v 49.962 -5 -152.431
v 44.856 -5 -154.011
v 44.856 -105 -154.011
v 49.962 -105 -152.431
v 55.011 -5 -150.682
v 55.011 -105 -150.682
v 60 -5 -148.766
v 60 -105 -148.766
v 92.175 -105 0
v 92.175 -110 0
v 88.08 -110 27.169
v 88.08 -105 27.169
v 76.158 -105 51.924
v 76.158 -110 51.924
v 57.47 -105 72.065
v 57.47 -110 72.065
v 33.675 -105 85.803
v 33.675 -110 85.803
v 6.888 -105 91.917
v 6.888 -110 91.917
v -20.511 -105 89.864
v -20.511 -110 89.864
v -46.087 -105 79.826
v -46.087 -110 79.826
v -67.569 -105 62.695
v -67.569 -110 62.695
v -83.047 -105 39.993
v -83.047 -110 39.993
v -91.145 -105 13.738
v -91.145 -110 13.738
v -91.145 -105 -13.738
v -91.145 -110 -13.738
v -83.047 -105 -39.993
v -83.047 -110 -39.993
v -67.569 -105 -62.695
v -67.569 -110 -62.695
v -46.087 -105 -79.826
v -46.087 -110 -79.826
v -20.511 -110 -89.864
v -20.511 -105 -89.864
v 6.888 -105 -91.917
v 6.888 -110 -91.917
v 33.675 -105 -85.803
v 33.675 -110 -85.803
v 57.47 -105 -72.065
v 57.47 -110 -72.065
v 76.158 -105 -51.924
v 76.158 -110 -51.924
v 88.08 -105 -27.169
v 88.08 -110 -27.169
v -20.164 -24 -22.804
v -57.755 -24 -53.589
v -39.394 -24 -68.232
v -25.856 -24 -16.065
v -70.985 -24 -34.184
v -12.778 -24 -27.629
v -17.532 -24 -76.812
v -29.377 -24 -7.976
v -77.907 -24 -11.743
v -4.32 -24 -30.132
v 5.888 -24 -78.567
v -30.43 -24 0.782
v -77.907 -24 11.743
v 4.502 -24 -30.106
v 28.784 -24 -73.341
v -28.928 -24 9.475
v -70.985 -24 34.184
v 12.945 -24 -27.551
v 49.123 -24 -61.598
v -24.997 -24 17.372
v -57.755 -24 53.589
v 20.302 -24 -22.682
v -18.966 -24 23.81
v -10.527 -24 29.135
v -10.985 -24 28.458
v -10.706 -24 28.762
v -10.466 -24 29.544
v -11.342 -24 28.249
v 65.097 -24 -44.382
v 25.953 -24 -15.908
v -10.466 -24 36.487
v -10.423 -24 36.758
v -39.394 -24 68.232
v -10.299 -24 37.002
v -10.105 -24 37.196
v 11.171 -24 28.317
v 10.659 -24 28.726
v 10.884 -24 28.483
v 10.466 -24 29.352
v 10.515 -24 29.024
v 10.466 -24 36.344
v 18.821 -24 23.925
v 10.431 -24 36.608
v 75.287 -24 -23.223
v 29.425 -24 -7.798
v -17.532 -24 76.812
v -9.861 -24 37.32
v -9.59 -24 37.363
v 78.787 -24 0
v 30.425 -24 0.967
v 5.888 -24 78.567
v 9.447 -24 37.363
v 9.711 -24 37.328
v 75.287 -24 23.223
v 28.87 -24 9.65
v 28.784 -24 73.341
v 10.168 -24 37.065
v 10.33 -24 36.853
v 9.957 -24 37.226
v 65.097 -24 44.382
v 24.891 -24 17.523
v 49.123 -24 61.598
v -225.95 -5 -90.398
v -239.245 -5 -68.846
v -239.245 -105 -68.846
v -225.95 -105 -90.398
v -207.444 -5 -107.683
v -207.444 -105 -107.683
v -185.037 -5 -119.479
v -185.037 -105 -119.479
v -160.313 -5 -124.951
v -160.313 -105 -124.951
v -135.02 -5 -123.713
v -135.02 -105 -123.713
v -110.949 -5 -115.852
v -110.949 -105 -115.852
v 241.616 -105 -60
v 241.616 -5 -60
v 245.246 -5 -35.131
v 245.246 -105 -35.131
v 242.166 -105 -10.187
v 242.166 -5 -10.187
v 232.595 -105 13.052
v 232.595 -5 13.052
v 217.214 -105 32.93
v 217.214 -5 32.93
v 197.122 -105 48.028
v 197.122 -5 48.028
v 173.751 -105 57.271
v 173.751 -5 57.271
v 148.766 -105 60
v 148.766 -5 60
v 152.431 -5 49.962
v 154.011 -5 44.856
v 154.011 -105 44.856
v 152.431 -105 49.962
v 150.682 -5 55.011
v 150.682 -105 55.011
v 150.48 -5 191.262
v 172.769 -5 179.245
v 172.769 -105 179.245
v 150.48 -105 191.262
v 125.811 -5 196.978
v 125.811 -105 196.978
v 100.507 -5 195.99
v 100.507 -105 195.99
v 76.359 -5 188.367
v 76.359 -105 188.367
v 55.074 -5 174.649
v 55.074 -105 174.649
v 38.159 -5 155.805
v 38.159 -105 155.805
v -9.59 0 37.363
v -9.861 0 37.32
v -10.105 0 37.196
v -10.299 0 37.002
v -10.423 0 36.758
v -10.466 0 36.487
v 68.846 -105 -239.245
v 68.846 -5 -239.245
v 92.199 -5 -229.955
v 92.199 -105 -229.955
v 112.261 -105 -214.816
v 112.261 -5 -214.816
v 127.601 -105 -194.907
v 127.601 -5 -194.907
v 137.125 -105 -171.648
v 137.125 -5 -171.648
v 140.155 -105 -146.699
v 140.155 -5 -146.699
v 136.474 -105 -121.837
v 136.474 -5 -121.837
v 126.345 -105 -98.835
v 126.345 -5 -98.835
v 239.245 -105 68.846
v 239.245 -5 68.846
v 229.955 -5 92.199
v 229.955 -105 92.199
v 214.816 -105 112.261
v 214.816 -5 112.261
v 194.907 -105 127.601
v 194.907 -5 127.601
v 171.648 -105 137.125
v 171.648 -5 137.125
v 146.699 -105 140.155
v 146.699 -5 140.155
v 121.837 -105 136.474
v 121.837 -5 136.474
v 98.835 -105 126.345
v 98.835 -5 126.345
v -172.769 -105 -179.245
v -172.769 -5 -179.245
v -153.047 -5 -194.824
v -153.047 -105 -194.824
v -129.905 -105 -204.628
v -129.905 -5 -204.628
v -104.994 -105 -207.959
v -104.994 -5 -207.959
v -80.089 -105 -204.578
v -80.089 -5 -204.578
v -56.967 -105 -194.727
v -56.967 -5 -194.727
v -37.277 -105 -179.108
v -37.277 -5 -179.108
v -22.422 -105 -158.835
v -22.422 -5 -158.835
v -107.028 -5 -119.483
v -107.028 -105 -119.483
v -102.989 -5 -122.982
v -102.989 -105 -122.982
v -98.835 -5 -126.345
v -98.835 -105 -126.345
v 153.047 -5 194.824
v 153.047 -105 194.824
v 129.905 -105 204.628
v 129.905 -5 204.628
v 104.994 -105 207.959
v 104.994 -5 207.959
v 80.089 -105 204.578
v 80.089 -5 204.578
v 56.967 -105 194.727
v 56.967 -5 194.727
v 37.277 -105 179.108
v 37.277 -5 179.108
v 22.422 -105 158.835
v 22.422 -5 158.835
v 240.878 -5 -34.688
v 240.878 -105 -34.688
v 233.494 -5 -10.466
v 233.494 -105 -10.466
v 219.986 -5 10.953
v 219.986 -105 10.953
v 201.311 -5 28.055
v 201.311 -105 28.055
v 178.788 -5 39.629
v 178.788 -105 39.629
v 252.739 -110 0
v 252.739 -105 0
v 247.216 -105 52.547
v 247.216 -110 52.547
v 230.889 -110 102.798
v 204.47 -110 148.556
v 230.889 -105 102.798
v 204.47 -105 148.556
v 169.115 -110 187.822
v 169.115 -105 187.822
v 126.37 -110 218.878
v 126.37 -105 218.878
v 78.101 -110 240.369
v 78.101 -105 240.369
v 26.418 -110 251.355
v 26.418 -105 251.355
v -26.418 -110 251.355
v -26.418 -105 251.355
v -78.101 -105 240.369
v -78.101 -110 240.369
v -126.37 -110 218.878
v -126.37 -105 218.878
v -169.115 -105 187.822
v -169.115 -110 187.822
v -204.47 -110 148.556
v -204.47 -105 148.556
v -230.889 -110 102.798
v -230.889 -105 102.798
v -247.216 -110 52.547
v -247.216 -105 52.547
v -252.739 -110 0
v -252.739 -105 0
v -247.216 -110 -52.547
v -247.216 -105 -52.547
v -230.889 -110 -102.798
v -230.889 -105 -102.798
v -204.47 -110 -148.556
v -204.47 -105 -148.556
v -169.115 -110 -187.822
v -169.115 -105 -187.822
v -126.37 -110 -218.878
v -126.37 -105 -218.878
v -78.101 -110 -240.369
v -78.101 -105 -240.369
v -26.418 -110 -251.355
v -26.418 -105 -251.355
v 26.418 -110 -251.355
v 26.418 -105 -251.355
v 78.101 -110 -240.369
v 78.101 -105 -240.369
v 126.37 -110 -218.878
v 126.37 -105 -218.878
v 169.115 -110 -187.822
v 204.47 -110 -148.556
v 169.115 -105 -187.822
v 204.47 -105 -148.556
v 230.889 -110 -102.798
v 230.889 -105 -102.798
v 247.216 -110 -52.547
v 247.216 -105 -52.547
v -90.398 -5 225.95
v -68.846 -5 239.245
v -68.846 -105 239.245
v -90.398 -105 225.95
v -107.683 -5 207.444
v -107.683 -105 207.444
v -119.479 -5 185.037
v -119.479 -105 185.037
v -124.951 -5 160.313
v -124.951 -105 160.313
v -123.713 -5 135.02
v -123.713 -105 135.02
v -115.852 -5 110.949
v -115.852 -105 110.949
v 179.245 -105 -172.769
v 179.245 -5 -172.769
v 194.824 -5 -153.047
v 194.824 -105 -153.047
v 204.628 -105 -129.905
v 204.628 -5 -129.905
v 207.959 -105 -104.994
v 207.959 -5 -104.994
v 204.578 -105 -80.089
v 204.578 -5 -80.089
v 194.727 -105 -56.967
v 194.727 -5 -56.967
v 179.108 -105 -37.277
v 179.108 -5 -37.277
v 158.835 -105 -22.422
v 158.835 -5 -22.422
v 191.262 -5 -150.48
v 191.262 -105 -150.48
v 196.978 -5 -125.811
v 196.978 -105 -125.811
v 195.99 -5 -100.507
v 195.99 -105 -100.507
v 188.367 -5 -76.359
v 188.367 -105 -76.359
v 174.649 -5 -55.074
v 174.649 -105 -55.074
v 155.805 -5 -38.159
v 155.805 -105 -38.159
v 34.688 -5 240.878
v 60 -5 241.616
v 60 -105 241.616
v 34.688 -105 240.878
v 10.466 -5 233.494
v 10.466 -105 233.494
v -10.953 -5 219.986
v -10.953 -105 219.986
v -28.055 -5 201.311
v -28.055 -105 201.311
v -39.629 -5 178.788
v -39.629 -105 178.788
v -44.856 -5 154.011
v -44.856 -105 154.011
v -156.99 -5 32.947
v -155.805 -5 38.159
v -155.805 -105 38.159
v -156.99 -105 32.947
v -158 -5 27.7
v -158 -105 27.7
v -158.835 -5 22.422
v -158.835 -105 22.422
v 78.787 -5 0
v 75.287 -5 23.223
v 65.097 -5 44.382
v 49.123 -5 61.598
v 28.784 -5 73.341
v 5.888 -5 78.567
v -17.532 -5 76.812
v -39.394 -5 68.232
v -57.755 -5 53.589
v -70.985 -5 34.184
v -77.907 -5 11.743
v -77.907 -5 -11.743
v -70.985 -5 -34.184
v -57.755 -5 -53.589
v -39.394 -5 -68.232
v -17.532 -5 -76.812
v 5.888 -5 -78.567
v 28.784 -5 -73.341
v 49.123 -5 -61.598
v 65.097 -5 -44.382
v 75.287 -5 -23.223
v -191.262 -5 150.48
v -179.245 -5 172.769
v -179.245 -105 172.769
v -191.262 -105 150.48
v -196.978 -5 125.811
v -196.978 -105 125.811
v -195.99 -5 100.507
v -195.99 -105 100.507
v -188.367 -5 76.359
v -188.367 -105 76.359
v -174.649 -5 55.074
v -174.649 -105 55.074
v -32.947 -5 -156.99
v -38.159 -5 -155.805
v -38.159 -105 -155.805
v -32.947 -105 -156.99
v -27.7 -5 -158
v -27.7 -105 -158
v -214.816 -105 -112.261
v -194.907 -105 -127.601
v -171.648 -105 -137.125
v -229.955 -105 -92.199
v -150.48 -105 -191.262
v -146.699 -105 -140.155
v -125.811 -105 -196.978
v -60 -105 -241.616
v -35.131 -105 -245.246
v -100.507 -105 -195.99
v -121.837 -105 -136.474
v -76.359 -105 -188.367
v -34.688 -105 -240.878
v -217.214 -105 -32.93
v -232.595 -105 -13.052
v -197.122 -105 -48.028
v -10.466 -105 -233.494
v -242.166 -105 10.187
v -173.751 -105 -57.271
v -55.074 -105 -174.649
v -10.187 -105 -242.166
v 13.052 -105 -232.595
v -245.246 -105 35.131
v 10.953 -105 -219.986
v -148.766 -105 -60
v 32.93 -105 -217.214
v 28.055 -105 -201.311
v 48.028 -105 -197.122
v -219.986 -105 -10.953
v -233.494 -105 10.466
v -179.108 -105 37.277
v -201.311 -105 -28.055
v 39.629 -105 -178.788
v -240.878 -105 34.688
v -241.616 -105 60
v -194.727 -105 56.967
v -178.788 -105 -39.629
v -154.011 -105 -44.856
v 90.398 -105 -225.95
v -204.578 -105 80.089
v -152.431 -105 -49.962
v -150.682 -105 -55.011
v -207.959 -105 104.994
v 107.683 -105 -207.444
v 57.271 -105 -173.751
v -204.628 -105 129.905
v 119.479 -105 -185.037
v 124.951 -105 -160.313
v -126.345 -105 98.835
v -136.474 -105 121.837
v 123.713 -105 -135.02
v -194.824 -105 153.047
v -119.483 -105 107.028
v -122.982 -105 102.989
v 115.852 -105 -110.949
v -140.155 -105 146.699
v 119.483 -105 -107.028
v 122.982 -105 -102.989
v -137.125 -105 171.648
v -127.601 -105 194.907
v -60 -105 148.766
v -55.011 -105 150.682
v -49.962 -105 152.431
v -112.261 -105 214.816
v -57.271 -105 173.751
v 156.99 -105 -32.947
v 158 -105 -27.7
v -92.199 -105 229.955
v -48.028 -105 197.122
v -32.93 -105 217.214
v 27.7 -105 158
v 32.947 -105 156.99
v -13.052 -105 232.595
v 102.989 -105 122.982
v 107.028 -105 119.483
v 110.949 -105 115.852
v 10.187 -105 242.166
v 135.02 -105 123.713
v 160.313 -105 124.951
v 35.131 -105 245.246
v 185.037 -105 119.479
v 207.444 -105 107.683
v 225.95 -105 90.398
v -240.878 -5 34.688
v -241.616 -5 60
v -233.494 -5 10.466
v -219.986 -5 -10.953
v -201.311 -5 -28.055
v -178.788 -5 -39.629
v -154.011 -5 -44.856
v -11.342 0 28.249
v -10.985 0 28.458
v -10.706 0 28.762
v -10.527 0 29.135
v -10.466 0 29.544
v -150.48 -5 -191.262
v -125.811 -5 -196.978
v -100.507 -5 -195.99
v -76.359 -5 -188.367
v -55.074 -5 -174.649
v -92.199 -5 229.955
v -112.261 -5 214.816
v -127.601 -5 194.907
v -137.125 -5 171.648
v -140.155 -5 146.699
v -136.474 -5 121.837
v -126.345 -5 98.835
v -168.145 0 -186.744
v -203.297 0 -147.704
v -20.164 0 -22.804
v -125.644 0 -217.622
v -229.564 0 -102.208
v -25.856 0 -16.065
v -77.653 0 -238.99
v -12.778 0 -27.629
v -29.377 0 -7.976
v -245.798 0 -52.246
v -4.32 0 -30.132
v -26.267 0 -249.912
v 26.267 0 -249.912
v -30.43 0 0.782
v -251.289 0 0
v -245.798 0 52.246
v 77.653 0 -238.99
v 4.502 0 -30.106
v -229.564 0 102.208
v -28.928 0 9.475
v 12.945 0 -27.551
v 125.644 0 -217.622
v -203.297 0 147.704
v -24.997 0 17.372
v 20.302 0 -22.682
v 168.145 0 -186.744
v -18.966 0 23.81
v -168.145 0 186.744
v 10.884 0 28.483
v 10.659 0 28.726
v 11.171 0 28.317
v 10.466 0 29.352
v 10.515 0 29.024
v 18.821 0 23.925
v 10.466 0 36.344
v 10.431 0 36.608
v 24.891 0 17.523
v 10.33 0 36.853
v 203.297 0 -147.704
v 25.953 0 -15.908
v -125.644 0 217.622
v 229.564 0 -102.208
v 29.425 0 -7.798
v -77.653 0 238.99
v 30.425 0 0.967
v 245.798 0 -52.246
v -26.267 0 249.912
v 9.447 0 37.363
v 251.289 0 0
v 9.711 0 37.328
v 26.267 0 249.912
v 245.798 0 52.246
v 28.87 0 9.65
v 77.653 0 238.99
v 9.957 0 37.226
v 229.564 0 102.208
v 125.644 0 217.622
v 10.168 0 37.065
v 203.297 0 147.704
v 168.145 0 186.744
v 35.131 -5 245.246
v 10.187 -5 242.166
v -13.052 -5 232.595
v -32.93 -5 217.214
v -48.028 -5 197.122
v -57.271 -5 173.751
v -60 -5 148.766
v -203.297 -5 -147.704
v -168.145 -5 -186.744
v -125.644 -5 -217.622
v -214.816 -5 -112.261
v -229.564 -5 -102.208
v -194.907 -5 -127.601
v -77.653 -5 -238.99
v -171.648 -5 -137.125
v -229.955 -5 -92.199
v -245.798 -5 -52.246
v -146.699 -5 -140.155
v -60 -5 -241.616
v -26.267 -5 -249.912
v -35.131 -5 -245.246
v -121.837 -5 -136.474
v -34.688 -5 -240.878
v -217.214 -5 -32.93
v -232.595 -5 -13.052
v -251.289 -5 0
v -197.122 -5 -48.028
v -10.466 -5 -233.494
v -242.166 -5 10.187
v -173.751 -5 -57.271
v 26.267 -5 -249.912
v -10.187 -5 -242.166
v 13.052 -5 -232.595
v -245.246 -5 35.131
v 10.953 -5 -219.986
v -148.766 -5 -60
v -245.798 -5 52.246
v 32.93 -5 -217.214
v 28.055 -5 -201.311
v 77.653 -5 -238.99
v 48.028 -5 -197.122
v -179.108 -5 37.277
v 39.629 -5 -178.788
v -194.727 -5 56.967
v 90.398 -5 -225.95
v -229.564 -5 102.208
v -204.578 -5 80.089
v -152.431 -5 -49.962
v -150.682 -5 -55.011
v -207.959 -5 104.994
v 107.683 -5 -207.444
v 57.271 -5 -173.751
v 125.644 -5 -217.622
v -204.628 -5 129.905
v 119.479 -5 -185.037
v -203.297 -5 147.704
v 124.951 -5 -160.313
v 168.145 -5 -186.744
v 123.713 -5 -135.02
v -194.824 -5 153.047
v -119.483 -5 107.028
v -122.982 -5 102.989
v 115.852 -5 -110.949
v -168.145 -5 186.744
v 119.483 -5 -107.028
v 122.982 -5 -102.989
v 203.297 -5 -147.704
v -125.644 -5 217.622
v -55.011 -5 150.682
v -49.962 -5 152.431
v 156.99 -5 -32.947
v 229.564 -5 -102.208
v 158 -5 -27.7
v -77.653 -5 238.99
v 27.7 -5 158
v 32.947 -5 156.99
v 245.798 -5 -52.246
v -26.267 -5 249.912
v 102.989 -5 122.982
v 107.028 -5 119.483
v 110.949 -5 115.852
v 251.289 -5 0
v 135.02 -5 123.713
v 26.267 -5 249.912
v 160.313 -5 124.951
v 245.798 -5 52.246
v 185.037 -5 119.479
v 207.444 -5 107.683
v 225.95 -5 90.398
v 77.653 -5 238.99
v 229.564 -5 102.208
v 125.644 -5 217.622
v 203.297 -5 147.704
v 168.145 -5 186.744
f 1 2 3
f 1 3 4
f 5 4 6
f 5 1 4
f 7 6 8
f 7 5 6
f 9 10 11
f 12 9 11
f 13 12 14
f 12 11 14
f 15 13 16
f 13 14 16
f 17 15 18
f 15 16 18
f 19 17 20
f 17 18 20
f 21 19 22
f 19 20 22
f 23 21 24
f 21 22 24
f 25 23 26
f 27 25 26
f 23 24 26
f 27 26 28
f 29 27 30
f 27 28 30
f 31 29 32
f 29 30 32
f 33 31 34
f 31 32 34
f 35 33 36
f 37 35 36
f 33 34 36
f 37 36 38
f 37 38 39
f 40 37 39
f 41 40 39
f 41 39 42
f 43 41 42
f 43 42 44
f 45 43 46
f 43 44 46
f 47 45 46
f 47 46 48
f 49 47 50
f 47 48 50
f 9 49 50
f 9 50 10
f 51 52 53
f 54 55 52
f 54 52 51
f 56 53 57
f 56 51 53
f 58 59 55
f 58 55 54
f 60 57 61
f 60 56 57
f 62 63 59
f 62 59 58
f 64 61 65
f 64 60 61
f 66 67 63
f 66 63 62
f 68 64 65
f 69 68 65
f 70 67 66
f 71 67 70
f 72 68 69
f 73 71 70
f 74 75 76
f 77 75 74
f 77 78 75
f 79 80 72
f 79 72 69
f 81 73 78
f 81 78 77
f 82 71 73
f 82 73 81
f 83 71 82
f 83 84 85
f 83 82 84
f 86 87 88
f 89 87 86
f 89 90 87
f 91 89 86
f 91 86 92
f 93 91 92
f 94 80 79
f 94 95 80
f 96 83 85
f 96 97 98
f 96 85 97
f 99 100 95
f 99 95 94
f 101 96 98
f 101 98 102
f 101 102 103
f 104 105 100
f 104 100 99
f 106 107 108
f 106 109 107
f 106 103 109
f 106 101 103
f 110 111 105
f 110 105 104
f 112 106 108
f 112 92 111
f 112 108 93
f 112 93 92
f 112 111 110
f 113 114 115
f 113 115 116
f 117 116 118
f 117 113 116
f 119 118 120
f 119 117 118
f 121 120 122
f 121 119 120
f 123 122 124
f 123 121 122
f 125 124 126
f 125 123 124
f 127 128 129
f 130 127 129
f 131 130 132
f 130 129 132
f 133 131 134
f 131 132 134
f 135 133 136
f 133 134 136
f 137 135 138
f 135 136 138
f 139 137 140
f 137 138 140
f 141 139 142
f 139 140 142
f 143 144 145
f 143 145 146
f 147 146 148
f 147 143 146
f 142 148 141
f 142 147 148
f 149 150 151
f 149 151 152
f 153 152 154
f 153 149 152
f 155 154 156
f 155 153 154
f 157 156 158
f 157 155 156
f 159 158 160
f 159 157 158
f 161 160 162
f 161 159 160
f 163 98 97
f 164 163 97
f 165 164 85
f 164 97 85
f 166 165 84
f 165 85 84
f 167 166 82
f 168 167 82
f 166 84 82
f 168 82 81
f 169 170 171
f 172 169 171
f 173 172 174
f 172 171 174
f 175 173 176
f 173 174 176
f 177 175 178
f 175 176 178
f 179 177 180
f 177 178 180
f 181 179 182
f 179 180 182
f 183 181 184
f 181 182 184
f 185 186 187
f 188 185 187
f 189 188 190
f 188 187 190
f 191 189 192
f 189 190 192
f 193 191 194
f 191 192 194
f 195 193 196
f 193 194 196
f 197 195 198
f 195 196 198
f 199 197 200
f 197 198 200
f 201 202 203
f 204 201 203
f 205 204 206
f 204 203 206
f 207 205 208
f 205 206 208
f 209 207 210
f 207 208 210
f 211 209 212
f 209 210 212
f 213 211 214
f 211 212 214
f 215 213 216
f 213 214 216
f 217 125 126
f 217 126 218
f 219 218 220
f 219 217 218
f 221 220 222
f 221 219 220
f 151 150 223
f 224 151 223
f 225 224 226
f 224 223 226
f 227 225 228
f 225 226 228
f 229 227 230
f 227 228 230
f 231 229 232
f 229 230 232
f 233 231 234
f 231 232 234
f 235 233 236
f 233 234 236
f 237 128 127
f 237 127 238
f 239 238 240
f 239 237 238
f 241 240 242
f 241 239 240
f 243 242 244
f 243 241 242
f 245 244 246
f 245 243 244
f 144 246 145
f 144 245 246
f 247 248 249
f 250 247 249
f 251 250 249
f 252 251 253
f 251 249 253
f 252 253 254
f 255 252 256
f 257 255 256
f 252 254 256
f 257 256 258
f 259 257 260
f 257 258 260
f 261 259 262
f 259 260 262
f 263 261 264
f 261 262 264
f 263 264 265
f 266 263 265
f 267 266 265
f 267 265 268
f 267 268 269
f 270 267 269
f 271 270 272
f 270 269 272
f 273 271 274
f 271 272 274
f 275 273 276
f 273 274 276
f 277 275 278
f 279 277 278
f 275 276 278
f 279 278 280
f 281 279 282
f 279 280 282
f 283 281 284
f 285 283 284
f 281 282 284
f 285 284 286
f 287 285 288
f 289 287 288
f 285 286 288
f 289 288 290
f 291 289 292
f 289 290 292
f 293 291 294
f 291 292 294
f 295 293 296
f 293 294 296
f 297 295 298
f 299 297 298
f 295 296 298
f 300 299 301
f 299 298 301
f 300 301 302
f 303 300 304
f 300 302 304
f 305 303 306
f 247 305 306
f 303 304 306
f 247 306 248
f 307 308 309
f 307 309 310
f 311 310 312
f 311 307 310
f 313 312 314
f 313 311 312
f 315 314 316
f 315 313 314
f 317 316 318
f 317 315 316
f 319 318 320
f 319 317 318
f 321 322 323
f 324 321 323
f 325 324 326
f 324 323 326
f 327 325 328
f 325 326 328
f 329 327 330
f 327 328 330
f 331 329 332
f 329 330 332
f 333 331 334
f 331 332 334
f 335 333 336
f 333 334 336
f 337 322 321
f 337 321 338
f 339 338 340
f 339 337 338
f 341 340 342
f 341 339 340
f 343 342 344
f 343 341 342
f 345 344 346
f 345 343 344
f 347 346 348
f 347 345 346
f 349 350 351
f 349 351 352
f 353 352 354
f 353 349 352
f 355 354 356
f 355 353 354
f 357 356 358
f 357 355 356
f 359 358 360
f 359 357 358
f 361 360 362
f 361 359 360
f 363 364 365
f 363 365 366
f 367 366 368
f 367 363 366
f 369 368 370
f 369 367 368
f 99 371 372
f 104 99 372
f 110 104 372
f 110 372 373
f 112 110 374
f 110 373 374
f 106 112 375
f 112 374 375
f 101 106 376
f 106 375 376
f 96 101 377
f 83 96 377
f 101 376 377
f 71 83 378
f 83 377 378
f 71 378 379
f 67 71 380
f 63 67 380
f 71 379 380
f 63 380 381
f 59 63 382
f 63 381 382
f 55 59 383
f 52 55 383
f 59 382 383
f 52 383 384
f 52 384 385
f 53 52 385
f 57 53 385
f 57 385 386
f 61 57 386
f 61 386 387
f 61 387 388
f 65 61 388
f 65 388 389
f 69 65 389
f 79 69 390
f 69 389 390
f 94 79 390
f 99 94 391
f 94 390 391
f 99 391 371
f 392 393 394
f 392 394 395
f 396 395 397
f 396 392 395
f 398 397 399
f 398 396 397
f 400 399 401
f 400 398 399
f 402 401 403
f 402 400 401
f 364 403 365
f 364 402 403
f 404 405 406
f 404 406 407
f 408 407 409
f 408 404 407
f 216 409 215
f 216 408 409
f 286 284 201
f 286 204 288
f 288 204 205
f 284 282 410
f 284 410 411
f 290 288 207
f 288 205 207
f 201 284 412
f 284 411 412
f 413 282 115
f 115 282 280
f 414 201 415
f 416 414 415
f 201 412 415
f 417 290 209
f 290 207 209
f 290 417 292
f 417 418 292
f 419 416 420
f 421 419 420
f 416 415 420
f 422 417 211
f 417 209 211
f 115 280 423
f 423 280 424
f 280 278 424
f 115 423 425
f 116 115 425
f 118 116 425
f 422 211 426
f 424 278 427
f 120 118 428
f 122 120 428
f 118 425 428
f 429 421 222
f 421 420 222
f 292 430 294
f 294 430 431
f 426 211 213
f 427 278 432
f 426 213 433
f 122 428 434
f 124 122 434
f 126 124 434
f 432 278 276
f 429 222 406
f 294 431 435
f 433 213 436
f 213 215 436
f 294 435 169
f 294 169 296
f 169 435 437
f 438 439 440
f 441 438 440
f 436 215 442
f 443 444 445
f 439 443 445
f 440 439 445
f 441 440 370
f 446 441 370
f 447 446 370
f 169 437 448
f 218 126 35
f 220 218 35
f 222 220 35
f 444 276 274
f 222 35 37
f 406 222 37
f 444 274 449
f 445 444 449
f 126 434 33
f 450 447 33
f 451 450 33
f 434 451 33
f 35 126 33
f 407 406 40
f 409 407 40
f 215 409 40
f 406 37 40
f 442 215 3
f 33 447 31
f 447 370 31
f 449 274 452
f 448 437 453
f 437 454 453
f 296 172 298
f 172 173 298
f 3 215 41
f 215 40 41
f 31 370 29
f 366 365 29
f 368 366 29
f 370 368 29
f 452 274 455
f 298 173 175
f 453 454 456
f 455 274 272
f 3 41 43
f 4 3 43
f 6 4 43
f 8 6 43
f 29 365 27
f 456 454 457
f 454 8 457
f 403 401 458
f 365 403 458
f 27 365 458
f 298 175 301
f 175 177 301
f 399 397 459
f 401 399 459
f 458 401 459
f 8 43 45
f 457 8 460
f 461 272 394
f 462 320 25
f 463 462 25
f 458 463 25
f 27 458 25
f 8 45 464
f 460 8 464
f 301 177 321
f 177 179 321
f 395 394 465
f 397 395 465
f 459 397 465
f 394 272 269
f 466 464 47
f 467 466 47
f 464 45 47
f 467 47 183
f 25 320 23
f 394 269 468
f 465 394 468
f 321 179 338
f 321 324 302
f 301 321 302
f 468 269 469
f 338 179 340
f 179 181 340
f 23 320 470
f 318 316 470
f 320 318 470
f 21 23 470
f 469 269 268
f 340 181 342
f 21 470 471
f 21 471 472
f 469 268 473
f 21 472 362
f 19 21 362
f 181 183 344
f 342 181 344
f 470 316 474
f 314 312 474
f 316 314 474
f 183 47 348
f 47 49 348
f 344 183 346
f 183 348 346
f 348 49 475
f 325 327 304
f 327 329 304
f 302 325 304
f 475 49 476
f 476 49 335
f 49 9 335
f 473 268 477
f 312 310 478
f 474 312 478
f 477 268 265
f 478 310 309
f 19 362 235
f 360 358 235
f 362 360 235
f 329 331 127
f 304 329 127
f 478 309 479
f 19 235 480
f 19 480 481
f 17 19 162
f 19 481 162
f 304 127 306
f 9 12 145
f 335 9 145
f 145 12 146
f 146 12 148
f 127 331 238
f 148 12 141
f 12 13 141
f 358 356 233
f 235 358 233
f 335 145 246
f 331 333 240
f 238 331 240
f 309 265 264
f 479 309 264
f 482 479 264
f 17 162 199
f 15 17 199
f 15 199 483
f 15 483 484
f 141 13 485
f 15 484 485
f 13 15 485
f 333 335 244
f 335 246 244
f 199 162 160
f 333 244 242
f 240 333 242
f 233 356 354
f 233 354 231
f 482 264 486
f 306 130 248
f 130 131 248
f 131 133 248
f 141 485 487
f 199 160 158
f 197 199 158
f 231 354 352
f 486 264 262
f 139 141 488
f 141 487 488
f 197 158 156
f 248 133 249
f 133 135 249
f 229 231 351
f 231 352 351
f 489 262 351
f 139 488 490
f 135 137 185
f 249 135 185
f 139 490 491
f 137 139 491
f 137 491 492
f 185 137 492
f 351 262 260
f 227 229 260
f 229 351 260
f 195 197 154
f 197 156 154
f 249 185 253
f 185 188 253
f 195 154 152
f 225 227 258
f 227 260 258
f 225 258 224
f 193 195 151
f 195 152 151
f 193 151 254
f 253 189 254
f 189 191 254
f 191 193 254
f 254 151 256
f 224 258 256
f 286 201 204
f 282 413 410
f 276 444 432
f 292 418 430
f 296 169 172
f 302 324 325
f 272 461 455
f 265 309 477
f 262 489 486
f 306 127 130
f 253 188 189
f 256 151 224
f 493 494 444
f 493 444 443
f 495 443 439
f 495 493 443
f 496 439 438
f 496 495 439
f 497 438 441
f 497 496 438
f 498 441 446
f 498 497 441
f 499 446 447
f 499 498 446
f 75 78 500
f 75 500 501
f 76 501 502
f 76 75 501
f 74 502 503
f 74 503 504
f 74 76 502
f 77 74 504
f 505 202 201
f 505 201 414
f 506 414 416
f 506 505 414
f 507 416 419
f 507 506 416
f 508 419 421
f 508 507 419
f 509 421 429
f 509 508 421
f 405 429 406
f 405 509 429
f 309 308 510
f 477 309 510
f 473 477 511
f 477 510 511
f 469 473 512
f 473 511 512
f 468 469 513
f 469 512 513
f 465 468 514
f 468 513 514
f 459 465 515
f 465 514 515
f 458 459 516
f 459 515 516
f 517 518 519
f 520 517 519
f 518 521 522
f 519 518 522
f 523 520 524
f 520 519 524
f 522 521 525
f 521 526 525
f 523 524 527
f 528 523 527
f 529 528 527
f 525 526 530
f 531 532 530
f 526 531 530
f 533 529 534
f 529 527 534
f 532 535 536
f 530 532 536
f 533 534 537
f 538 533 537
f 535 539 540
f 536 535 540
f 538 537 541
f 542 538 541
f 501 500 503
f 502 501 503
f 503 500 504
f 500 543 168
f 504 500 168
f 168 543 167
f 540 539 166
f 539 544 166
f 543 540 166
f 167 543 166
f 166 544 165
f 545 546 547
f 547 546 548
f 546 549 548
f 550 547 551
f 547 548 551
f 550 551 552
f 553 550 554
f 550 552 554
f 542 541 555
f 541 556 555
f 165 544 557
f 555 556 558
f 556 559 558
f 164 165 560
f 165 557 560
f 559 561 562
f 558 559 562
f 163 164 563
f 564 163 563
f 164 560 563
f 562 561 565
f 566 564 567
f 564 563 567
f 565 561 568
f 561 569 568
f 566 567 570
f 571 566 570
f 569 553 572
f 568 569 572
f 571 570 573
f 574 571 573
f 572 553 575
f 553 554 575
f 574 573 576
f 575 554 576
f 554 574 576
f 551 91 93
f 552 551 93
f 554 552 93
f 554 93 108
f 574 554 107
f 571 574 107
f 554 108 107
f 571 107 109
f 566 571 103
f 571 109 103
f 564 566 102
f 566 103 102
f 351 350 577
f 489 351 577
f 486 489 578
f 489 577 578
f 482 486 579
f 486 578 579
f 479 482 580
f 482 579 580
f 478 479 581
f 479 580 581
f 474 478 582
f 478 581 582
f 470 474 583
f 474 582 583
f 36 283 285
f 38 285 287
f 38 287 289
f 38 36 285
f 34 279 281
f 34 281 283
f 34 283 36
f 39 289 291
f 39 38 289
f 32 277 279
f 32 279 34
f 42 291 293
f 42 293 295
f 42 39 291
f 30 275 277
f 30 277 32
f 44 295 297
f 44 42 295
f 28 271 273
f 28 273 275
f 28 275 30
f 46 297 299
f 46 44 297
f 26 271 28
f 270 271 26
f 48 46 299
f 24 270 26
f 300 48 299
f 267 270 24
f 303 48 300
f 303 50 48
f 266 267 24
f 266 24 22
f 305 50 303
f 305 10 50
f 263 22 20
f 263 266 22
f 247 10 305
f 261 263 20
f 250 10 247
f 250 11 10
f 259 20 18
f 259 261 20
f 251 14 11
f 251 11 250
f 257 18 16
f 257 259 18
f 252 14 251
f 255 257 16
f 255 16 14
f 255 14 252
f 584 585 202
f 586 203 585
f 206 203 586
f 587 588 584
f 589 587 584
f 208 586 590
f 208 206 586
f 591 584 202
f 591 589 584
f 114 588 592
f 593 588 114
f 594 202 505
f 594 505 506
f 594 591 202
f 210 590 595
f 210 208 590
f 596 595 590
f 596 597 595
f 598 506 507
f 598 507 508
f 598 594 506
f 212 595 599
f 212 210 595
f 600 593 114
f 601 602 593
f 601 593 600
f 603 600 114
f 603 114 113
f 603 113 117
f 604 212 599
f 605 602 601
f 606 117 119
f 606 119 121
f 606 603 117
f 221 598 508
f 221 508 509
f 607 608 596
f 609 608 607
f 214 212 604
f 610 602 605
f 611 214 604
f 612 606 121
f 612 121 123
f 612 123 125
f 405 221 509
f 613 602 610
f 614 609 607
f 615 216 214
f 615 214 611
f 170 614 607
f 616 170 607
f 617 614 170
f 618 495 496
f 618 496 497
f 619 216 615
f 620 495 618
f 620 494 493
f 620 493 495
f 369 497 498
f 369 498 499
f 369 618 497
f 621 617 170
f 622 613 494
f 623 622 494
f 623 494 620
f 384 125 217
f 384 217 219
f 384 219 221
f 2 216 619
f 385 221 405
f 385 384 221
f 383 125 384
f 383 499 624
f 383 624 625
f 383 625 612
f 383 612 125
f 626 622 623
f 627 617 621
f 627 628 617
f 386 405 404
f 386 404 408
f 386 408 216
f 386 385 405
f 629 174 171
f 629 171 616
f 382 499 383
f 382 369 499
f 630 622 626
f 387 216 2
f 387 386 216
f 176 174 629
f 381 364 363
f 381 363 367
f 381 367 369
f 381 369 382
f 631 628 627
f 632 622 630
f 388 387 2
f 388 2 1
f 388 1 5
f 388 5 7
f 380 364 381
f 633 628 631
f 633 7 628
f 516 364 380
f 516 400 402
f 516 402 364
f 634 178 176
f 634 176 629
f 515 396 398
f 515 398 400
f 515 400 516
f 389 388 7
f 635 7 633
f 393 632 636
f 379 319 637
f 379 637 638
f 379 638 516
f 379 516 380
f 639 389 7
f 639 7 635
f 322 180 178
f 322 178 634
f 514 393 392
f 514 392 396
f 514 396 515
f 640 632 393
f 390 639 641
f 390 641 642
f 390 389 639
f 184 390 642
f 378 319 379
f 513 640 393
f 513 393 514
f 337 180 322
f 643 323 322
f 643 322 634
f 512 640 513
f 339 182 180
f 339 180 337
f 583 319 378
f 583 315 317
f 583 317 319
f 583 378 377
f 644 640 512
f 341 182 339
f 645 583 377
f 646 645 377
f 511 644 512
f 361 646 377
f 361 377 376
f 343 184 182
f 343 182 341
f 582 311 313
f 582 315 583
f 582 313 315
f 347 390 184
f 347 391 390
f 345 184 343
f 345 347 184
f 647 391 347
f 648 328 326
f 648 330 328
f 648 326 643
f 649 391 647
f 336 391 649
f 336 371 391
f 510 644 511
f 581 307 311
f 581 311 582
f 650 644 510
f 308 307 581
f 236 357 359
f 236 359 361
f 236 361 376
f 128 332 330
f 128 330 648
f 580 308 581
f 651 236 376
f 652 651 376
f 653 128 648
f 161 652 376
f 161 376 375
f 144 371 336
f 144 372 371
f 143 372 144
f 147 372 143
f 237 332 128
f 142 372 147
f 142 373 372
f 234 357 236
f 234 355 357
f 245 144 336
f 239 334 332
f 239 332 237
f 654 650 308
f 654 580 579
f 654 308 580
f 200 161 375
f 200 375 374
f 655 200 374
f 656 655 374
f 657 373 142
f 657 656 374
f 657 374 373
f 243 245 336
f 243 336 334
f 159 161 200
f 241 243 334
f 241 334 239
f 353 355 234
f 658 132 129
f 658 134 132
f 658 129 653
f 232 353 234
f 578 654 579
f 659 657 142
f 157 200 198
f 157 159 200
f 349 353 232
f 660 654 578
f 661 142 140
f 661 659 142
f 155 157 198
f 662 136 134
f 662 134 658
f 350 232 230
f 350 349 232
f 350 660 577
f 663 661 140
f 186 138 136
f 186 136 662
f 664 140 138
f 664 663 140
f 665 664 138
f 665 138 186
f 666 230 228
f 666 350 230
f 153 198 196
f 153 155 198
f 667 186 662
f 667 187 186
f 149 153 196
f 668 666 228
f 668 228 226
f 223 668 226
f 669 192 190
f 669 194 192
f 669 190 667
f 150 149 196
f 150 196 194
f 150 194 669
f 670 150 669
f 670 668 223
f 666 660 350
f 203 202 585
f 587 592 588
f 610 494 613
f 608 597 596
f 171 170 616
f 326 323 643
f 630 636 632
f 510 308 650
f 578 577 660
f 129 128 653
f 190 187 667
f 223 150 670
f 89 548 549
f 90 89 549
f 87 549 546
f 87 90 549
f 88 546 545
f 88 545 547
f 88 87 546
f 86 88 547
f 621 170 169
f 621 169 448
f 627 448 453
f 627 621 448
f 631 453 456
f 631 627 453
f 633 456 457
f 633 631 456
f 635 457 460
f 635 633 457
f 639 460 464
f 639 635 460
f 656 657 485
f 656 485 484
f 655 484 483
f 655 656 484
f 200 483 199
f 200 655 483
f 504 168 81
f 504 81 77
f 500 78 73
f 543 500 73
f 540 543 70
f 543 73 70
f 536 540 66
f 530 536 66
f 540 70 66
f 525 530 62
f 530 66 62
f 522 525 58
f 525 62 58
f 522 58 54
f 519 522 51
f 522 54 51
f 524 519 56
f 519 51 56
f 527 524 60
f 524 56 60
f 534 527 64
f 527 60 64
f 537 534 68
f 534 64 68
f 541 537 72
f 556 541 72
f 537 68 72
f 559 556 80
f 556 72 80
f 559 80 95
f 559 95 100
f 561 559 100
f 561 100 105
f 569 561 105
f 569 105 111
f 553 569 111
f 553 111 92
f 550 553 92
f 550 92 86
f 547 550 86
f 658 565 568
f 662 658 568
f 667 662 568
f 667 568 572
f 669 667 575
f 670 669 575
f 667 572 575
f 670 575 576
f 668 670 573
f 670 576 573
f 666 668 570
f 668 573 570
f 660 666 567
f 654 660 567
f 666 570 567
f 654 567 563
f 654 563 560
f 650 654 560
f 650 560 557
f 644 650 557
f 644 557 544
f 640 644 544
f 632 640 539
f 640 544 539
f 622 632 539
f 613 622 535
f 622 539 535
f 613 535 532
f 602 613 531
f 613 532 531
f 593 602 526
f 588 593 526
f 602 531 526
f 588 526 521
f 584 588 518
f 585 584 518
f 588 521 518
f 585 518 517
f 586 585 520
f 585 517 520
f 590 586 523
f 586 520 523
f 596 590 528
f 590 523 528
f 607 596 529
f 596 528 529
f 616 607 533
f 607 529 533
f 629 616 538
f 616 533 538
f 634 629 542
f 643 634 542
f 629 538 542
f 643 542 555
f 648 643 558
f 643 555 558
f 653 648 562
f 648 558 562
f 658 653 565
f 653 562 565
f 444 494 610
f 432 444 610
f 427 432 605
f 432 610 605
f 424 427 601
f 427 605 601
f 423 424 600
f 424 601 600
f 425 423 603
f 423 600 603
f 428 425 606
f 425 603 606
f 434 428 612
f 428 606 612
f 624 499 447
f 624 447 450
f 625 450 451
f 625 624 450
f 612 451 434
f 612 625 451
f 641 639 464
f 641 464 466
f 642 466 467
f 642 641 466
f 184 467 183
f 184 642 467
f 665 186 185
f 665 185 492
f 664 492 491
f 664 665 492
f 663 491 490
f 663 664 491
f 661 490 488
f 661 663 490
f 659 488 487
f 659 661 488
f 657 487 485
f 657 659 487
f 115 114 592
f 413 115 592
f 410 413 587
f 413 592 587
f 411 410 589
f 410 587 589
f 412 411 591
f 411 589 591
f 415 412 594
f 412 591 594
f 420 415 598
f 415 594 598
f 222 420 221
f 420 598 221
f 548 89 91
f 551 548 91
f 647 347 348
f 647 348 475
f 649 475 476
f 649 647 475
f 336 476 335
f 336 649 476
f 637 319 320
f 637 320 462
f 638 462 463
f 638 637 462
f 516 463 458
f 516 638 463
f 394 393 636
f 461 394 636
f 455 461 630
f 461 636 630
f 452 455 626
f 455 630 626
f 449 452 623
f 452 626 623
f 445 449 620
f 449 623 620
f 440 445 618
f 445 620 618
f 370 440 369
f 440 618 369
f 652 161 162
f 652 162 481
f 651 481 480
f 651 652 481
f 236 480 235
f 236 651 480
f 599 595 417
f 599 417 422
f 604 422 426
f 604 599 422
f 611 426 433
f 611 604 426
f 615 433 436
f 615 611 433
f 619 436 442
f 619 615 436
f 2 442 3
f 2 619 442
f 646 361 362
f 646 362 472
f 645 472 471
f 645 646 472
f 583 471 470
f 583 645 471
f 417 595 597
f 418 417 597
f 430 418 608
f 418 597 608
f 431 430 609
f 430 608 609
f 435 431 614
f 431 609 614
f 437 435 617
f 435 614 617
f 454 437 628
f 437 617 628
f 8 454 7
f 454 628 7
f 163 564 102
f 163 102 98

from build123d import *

# Parameters (mm, degrees)
SKETCH_R           = 251.288776
PAD_DEPTH          = 5
SKETCH001_R        = 78.787228
PAD001_DEPTH       = 19
POCKET_DEPTH       = 24.001
PAD002_DEPTH       = 100
POLARPATTERN_COUNT = 12
SKETCH004_R        = 252.739118
PAD003_DEPTH       = 5
SKETCH005_R        = 92.174815
POCKET001_DEPTH    = 5


with BuildPart() as part:
    # Sketch → Pad (new body)
    with BuildSketch(Plane.XZ):
        Circle(SKETCH_R)
    extrude(amount=PAD_DEPTH)

    # Sketch001 (on Face3 of Pad) → Pad001 (join)
    with BuildSketch(Plane.XZ.offset(5)):
        Circle(SKETCH001_R)
    extrude(amount=PAD001_DEPTH)

    # Sketch002 (on Face5 of Pad001) → Pocket (cut, through all)
    with BuildSketch(Plane.XZ.offset(24)):
        with BuildLine():
            ThreePointArc((-11.342065, 28.248508), (0.09221, -30.440304), (11.170717, 28.316704))
            ThreePointArc((10.466113, 29.352113), (10.658972, 28.725907), (11.170717, 28.316704))
            Line((10.466113, 29.352113), (10.466113, 36.343864))
            ThreePointArc((10.466113, 36.343864), (10.16761, 37.064515), (9.446959, 37.363018))
            Line((9.446959, 37.363018), (-9.589921, 37.363018))
            ThreePointArc((-9.589921, 37.363018), (-10.209482, 37.106387), (-10.466113, 36.486826))
            Line((-10.466113, 36.486826), (-10.466113, 29.544133))
            ThreePointArc((-11.342065, 28.248508), (-10.705649, 28.762158), (-10.466113, 29.544133))
        make_face()
    extrude(amount=-POCKET_DEPTH, mode=Mode.SUBTRACT)

    # Sketch003 (on Face3 of Pocket) → Pad002 (join)
    with BuildSketch(Plane.XZ.offset(5)):
        with BuildLine():
            ThreePointArc((-44.856391, 154.010557), (-52.493731, 151.577556), (-60, 148.766083))
            ThreePointArc((60, 241.615551), (-23.506563, 225.571041), (-60, 148.766083))
            ThreePointArc((60, 241.615551), (-10.953355, 219.986234), (-44.856391, 154.010557))
        make_face()
    pad002 = extrude(amount=PAD002_DEPTH)

    # PolarPattern: Pad002 ×12 about axis
    polarpattern_axis = Axis((0, -5, 0), (0, -1, 0))
    for i in range(1, POLARPATTERN_COUNT):
        add(pad002.rotate(polarpattern_axis, i * 360 / POLARPATTERN_COUNT))

    # Sketch004 (on Face55 of PolarPattern) → Pad003 (join)
    with BuildSketch(Plane.XZ.offset(105)):
        Circle(SKETCH004_R)
    extrude(amount=PAD003_DEPTH)

    # Sketch005 (on Face3 of Pad003) → Pocket001 (cut)
    with BuildSketch(Plane.XZ.offset(110)):
        Circle(SKETCH005_R)
    extrude(amount=-POCKET001_DEPTH, mode=Mode.SUBTRACT)


solid = part.part
